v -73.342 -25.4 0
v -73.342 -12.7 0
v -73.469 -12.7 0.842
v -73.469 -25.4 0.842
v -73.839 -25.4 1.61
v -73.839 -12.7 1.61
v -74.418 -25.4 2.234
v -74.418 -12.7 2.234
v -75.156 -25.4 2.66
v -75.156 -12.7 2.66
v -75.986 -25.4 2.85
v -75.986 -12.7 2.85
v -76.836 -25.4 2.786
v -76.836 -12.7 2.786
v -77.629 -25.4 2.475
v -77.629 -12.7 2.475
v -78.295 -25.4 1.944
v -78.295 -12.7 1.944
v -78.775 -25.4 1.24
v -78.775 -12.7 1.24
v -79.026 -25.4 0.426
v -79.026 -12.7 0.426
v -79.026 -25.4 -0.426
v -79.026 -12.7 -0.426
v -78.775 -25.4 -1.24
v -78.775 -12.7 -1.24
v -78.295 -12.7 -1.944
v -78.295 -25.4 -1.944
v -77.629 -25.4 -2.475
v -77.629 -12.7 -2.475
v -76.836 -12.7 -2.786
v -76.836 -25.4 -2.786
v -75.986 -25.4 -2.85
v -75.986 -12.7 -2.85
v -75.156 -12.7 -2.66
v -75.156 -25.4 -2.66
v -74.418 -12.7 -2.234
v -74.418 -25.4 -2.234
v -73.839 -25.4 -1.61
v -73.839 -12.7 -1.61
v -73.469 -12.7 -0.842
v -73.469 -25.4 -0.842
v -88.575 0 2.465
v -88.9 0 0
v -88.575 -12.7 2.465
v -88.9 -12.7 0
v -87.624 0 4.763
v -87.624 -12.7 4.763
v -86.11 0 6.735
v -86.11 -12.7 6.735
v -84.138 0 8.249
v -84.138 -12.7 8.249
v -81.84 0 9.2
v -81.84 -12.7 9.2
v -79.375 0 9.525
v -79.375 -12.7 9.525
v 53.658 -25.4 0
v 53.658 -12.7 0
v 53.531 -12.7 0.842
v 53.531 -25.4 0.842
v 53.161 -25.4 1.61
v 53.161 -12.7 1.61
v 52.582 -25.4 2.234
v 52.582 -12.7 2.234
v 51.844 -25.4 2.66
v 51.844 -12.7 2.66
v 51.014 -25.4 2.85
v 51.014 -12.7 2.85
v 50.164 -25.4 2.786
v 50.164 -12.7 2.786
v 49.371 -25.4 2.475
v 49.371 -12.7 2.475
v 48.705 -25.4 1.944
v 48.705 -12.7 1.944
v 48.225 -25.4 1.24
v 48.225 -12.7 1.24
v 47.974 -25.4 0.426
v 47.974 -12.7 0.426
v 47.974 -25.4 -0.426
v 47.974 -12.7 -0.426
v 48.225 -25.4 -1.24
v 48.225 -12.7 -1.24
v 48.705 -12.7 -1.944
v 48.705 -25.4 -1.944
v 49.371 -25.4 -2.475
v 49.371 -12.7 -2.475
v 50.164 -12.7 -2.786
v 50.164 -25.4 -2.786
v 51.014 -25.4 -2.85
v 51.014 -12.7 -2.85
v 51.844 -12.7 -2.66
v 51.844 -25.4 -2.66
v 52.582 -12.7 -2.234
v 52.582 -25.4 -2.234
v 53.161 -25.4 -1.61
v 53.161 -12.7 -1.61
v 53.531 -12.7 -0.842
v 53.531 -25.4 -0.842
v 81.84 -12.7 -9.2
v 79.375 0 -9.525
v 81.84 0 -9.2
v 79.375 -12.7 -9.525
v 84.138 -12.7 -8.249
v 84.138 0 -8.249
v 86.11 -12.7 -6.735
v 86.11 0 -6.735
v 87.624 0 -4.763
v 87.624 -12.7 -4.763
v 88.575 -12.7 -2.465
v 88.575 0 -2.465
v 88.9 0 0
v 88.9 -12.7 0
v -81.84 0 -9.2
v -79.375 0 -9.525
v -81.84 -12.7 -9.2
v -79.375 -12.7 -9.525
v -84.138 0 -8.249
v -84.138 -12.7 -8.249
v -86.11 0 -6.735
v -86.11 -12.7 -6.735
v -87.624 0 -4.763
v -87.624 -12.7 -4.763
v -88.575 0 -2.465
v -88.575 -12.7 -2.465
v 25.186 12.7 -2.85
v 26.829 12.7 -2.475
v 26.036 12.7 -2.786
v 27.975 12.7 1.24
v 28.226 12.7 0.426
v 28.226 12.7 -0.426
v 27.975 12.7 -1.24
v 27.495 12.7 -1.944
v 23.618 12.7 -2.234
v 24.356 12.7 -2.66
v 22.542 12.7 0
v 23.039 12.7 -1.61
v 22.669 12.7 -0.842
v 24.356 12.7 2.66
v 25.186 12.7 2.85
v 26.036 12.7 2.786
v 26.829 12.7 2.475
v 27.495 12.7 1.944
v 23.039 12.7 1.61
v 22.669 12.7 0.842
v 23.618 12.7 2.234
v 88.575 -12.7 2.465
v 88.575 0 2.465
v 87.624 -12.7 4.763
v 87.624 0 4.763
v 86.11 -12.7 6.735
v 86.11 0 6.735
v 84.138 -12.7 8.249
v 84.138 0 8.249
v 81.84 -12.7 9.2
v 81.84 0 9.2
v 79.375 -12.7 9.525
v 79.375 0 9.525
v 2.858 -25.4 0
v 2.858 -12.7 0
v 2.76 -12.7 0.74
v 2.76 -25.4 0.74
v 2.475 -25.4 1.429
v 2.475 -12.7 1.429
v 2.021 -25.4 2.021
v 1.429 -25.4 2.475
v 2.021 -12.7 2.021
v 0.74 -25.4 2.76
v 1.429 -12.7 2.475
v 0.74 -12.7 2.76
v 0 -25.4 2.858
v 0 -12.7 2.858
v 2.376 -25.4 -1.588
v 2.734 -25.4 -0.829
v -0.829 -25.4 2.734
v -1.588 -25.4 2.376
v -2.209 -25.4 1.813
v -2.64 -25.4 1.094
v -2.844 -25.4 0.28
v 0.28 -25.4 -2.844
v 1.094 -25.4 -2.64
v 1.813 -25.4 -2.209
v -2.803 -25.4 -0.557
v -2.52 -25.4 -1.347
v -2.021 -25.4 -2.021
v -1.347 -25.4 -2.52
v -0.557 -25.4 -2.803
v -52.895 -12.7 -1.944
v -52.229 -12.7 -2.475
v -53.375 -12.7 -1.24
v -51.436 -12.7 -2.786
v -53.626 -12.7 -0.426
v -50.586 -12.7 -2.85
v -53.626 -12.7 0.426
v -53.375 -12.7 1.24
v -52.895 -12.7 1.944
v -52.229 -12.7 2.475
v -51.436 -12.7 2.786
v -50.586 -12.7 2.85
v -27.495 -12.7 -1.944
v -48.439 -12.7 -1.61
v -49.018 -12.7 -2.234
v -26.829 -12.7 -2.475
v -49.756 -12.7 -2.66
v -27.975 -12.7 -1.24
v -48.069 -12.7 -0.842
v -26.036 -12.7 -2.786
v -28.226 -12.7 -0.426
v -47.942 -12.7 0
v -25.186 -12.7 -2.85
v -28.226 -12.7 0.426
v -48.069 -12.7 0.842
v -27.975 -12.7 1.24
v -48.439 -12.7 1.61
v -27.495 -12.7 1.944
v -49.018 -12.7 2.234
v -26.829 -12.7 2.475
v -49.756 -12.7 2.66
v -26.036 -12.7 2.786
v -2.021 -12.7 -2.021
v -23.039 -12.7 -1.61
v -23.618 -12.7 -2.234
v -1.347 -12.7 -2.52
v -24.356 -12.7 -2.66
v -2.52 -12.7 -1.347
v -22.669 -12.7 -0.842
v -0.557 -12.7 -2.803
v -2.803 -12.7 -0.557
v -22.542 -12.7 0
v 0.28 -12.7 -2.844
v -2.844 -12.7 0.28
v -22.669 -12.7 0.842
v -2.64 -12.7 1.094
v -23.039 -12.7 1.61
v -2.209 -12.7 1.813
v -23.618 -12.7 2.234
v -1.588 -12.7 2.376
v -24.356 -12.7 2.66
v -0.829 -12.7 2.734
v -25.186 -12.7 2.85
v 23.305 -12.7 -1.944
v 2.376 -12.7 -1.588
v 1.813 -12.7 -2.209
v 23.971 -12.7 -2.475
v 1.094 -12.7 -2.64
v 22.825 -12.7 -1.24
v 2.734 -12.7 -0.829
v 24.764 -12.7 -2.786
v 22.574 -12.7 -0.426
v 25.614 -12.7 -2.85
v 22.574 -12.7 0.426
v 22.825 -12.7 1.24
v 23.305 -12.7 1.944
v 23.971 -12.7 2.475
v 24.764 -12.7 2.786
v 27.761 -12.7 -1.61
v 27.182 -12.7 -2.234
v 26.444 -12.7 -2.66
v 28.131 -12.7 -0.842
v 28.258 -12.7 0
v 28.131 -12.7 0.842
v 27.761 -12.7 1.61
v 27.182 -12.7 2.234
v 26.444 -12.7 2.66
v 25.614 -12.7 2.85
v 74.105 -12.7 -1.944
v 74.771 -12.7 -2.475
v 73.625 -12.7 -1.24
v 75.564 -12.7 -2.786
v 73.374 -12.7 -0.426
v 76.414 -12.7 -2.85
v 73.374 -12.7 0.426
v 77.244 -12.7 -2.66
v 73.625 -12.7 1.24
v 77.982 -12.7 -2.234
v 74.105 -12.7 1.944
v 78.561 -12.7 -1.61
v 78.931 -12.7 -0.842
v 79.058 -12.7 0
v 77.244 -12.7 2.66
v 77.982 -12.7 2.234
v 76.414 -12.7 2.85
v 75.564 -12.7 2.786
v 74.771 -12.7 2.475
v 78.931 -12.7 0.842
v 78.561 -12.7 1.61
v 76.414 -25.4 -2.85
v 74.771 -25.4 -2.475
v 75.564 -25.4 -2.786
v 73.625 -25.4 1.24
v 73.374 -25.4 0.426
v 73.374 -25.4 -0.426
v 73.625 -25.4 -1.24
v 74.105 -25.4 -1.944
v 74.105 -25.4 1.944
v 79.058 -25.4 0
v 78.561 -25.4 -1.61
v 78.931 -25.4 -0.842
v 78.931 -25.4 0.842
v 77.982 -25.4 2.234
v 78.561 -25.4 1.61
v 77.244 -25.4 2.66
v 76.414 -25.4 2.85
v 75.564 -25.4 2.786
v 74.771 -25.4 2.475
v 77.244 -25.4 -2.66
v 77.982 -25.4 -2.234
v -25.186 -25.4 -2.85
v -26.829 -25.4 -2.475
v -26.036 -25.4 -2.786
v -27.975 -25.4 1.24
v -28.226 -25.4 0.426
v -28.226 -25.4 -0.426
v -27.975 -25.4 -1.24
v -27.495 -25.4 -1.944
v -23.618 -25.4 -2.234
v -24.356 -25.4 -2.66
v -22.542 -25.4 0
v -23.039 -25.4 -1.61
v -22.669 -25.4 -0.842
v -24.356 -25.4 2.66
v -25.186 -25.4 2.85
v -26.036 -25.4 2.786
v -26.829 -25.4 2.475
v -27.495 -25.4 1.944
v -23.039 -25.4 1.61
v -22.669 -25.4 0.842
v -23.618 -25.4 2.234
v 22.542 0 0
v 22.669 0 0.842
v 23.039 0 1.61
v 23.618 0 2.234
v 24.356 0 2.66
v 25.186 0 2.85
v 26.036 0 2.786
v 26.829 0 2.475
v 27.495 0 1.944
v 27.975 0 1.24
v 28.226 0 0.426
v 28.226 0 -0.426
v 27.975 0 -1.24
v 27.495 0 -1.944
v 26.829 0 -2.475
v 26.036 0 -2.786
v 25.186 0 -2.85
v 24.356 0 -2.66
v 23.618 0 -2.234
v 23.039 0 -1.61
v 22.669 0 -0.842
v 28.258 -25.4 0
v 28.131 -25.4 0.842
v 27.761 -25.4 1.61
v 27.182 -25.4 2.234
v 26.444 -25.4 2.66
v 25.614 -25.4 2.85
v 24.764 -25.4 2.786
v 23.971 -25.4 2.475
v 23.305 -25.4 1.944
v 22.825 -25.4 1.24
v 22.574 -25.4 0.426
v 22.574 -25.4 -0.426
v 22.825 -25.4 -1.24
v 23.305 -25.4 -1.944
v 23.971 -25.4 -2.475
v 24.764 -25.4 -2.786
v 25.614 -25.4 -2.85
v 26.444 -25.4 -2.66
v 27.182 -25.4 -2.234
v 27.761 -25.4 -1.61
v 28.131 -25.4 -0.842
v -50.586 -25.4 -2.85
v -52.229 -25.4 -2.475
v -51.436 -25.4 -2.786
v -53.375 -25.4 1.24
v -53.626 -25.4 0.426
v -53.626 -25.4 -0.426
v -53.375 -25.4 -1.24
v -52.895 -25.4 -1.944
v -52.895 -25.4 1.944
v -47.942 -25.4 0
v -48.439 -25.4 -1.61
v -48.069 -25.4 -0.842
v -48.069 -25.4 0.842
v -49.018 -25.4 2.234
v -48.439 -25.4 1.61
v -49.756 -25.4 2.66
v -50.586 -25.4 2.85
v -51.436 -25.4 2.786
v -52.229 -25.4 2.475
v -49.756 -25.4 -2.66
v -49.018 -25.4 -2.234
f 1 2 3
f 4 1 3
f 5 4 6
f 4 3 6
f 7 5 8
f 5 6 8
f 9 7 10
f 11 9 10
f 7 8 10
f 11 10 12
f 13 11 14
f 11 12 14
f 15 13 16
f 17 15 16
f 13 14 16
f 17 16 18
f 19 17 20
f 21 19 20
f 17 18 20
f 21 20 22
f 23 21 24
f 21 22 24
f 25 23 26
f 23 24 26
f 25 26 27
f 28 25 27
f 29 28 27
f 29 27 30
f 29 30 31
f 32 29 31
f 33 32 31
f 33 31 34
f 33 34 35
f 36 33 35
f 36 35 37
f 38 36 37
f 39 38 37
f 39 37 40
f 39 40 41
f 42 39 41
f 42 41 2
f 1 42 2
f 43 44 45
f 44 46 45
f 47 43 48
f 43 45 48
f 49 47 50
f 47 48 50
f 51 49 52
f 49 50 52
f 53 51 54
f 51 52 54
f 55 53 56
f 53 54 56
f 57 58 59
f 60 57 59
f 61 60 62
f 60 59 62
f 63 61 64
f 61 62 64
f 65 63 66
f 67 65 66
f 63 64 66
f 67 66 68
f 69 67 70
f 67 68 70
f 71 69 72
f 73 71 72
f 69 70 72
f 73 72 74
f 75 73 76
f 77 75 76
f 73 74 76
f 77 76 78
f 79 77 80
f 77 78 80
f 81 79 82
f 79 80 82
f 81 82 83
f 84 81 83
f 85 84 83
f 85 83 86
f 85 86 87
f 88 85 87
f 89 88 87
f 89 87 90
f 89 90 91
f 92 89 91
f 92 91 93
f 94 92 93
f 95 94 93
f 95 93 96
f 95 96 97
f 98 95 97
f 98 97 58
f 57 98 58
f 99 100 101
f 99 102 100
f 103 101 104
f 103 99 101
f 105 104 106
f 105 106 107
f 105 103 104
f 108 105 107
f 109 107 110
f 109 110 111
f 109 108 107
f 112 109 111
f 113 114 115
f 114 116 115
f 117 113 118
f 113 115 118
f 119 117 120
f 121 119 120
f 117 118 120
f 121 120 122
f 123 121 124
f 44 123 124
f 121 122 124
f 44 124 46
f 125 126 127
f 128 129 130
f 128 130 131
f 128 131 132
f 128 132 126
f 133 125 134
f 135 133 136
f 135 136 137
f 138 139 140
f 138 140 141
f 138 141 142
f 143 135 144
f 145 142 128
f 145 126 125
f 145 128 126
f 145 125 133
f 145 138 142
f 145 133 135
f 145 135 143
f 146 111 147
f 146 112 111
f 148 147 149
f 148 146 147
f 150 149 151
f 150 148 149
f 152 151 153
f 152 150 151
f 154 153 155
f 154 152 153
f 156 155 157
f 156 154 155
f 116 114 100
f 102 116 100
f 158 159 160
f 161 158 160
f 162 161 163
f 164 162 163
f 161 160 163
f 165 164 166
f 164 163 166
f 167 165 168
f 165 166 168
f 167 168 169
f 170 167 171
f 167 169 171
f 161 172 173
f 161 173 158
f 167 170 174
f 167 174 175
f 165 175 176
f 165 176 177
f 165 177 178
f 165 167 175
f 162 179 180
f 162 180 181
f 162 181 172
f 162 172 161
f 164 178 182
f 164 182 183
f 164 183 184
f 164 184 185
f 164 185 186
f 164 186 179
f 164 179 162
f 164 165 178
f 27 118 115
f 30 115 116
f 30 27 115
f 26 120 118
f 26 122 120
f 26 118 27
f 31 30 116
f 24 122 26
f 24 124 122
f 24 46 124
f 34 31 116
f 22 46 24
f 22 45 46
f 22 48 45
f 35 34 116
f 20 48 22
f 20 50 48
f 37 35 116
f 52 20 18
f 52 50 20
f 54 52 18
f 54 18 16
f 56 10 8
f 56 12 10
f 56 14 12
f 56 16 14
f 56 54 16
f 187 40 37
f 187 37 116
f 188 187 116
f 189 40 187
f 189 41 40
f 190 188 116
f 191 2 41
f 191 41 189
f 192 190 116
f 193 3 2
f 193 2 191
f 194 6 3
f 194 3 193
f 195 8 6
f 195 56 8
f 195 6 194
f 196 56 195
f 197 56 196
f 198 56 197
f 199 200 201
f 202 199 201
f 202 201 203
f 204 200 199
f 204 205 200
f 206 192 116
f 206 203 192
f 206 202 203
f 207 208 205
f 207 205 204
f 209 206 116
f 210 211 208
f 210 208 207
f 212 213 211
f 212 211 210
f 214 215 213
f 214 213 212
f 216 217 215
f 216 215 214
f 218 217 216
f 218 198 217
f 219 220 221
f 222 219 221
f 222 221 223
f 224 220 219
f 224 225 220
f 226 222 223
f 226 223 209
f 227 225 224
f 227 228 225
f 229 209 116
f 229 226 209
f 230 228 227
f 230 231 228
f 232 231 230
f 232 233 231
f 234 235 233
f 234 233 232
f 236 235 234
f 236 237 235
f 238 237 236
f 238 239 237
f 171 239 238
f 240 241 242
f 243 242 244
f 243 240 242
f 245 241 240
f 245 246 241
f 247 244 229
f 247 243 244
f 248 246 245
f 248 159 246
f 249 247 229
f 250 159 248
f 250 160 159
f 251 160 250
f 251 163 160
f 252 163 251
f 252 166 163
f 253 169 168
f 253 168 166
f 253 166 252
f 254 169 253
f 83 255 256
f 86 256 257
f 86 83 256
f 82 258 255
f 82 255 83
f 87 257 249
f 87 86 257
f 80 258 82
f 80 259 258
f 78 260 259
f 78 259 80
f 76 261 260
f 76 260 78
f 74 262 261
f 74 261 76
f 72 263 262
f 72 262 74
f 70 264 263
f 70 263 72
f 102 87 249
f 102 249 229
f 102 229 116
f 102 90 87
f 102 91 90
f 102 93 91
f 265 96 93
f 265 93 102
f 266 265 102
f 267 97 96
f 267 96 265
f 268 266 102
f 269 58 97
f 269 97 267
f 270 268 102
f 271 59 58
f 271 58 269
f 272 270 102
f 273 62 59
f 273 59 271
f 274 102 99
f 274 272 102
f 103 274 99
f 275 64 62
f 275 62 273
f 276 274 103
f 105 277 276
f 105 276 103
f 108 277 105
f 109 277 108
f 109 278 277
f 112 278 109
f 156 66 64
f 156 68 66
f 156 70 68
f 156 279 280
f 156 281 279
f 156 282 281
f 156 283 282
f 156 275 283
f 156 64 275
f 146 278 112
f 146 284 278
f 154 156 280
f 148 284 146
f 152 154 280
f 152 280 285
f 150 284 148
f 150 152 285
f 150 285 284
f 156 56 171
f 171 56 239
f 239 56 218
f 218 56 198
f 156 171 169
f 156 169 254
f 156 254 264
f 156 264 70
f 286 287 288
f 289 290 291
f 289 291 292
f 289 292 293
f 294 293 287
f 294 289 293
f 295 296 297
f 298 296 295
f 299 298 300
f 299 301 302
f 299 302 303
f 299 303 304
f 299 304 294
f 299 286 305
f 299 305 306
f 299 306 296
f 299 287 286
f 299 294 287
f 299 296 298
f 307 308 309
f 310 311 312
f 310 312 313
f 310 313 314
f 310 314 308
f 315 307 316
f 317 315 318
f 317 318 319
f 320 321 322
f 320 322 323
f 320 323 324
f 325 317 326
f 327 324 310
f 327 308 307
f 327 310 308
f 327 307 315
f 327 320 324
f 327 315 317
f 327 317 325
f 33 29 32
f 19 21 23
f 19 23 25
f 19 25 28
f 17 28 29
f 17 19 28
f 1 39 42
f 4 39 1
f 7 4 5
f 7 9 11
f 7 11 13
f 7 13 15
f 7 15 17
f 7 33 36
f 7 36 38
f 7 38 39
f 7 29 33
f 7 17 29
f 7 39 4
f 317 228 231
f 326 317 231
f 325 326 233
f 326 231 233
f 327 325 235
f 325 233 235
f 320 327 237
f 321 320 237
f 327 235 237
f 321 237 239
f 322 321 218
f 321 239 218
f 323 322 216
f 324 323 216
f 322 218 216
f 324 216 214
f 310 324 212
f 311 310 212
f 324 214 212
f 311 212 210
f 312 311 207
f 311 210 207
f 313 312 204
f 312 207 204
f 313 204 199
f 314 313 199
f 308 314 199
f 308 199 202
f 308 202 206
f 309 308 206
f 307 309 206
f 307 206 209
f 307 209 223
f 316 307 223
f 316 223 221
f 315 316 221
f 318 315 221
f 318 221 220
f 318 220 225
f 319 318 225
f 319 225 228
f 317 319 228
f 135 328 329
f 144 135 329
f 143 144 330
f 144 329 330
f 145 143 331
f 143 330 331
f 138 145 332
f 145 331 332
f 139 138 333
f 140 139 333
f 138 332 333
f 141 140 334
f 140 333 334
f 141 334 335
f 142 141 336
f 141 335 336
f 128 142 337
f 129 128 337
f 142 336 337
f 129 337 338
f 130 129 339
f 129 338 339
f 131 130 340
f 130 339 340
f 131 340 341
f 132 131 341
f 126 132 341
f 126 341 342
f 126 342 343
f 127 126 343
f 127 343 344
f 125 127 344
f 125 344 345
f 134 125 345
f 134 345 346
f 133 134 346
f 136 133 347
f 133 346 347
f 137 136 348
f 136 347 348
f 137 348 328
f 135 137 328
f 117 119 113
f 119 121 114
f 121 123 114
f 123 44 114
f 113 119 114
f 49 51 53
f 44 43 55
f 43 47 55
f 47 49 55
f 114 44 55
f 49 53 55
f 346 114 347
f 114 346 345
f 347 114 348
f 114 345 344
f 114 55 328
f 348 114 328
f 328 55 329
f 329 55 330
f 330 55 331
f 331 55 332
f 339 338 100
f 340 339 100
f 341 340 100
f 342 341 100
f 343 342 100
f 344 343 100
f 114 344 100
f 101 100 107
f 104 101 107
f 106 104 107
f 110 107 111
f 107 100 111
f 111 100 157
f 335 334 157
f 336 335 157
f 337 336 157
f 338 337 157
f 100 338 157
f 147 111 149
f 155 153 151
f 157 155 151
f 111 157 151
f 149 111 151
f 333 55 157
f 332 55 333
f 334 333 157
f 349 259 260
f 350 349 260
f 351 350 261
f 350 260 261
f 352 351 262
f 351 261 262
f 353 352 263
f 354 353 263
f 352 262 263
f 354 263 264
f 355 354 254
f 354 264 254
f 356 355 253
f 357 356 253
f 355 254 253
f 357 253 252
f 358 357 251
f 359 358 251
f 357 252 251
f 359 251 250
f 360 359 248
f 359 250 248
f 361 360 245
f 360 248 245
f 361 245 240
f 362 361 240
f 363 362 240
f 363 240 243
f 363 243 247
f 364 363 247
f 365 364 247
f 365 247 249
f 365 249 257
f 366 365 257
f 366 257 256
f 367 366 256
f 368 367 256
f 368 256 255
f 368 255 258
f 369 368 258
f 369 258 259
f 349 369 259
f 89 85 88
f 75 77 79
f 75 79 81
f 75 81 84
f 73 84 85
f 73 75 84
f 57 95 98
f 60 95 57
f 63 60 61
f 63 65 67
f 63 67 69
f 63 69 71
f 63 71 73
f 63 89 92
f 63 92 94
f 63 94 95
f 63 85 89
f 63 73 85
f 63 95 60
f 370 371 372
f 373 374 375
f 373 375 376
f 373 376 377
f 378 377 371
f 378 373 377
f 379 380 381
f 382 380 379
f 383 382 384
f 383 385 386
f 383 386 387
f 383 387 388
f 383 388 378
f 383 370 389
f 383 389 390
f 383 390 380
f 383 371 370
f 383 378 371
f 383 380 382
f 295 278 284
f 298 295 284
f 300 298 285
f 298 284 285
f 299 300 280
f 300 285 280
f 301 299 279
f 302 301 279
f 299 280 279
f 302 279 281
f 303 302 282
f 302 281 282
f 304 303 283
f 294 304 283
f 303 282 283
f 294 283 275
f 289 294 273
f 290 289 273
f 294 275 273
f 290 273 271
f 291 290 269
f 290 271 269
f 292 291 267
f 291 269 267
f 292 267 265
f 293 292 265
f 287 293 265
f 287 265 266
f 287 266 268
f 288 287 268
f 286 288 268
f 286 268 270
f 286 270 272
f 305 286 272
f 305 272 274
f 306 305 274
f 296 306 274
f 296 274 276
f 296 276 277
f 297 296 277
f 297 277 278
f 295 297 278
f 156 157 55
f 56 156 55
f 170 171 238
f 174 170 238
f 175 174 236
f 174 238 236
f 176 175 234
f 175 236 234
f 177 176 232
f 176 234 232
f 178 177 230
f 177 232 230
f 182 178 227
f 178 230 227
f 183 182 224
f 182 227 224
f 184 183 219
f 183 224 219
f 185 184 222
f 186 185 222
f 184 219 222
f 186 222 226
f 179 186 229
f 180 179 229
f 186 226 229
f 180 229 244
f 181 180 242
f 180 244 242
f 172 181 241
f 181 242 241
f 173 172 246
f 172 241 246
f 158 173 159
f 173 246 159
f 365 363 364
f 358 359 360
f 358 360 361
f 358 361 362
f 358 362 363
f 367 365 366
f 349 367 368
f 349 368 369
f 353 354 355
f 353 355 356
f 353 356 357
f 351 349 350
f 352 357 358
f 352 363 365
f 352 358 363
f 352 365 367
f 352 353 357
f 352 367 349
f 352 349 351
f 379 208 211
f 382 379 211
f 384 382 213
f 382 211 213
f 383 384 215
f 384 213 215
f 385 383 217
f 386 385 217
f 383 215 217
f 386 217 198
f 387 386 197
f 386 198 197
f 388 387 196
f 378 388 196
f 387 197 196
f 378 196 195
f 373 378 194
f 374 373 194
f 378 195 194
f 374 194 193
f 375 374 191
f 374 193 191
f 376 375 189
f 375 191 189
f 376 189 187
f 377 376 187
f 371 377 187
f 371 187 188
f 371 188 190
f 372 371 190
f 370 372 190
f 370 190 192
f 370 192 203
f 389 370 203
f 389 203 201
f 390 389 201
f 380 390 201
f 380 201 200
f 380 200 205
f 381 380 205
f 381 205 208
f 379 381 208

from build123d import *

# Parameters (mm, degrees)
F0_R     = 2.8575
F1_DEPTH = 12.7
F2_DEPTH = 25.4
F3_R     = 2.8575
F4_DEPTH = 12.7
F5_R     = 9.52499


# Not quite as in the source:
# - a fillet or chamfer is up to 0.001 mm smaller than in the source, because OpenCascade refuses the exact size
# - a feature names something its author has since deleted; it is built from what else it names


with BuildPart() as f1:
    # F0 (on Front) → F1 (new body)
    with BuildSketch(Plane.XZ):
        Polygon((-88.9, -9.525), (88.9, -9.525), (88.9, 9.525), (0, 9.525), (-88.9, 9.525), align=None)
        with Locations((-76.2, 0)):
            Circle(F0_R, mode=Mode.SUBTRACT)
        with Locations((-50.8, 0)):
            Circle(F0_R, mode=Mode.SUBTRACT)
        with Locations((-25.4, 0)):
            Circle(F0_R, mode=Mode.SUBTRACT)
        with BuildLine():
            ThreePointArc((2.8575, 0), (-2.0205576272, -2.0205576272), (0, 2.8575))
            ThreePointArc((0, 2.8575), (2.0205576272, 2.0205576272), (2.8575, 0))
        make_face(mode=Mode.SUBTRACT)
        with Locations((25.4, 0)):
            Circle(F0_R, mode=Mode.SUBTRACT)
        with Locations((50.8, 0)):
            Circle(F0_R, mode=Mode.SUBTRACT)
        with Locations((76.2, 0)):
            Circle(F0_R, mode=Mode.SUBTRACT)
    extrude(amount=F1_DEPTH)

    # F0 (on Front) → F2 (join)
    with BuildSketch(Plane.XZ):
        with BuildLine():
            ThreePointArc((2.8575, 0), (2.0205576272, 2.0205576272), (0, 2.8575))
            ThreePointArc((0, 2.8575), (-2.0205576272, -2.0205576272), (2.8575, 0))
        make_face()
        with Locations((-76.2, 0)):
            Circle(F0_R)
        with Locations((-50.8, 0)):
            Circle(F0_R)
        with Locations((-25.4, 0)):
            Circle(F0_R)
        with Locations((25.4, 0)):
            Circle(F0_R)
        with Locations((50.8, 0)):
            Circle(F0_R)
        with Locations((76.2, 0)):
            Circle(F0_R)
    extrude(amount=F2_DEPTH)

    # F3 (on face) → F4 (join)
    with BuildSketch(Plane(origin=(0, 0, 0), x_dir=(-1, 0, 0), z_dir=(0, 1, 0))):
        with Locations((-25.4, 0)):
            Circle(F3_R)
    extrude(amount=F4_DEPTH)

    # F5 (radius 9.525 in the source; OpenCascade refuses exactly that, so slightly less here)
    f5_edges = [f1.edges().sort_by_distance(p)[0] for p in [
        (88.9, -6.35, 9.525),
        (88.9, -6.35, -9.525),
        (-88.9, -6.35, -9.525),
        (-88.9, -6.35, 9.525),
    ]]
    fillet(f5_edges, radius=F5_R)


solid = f1.part
